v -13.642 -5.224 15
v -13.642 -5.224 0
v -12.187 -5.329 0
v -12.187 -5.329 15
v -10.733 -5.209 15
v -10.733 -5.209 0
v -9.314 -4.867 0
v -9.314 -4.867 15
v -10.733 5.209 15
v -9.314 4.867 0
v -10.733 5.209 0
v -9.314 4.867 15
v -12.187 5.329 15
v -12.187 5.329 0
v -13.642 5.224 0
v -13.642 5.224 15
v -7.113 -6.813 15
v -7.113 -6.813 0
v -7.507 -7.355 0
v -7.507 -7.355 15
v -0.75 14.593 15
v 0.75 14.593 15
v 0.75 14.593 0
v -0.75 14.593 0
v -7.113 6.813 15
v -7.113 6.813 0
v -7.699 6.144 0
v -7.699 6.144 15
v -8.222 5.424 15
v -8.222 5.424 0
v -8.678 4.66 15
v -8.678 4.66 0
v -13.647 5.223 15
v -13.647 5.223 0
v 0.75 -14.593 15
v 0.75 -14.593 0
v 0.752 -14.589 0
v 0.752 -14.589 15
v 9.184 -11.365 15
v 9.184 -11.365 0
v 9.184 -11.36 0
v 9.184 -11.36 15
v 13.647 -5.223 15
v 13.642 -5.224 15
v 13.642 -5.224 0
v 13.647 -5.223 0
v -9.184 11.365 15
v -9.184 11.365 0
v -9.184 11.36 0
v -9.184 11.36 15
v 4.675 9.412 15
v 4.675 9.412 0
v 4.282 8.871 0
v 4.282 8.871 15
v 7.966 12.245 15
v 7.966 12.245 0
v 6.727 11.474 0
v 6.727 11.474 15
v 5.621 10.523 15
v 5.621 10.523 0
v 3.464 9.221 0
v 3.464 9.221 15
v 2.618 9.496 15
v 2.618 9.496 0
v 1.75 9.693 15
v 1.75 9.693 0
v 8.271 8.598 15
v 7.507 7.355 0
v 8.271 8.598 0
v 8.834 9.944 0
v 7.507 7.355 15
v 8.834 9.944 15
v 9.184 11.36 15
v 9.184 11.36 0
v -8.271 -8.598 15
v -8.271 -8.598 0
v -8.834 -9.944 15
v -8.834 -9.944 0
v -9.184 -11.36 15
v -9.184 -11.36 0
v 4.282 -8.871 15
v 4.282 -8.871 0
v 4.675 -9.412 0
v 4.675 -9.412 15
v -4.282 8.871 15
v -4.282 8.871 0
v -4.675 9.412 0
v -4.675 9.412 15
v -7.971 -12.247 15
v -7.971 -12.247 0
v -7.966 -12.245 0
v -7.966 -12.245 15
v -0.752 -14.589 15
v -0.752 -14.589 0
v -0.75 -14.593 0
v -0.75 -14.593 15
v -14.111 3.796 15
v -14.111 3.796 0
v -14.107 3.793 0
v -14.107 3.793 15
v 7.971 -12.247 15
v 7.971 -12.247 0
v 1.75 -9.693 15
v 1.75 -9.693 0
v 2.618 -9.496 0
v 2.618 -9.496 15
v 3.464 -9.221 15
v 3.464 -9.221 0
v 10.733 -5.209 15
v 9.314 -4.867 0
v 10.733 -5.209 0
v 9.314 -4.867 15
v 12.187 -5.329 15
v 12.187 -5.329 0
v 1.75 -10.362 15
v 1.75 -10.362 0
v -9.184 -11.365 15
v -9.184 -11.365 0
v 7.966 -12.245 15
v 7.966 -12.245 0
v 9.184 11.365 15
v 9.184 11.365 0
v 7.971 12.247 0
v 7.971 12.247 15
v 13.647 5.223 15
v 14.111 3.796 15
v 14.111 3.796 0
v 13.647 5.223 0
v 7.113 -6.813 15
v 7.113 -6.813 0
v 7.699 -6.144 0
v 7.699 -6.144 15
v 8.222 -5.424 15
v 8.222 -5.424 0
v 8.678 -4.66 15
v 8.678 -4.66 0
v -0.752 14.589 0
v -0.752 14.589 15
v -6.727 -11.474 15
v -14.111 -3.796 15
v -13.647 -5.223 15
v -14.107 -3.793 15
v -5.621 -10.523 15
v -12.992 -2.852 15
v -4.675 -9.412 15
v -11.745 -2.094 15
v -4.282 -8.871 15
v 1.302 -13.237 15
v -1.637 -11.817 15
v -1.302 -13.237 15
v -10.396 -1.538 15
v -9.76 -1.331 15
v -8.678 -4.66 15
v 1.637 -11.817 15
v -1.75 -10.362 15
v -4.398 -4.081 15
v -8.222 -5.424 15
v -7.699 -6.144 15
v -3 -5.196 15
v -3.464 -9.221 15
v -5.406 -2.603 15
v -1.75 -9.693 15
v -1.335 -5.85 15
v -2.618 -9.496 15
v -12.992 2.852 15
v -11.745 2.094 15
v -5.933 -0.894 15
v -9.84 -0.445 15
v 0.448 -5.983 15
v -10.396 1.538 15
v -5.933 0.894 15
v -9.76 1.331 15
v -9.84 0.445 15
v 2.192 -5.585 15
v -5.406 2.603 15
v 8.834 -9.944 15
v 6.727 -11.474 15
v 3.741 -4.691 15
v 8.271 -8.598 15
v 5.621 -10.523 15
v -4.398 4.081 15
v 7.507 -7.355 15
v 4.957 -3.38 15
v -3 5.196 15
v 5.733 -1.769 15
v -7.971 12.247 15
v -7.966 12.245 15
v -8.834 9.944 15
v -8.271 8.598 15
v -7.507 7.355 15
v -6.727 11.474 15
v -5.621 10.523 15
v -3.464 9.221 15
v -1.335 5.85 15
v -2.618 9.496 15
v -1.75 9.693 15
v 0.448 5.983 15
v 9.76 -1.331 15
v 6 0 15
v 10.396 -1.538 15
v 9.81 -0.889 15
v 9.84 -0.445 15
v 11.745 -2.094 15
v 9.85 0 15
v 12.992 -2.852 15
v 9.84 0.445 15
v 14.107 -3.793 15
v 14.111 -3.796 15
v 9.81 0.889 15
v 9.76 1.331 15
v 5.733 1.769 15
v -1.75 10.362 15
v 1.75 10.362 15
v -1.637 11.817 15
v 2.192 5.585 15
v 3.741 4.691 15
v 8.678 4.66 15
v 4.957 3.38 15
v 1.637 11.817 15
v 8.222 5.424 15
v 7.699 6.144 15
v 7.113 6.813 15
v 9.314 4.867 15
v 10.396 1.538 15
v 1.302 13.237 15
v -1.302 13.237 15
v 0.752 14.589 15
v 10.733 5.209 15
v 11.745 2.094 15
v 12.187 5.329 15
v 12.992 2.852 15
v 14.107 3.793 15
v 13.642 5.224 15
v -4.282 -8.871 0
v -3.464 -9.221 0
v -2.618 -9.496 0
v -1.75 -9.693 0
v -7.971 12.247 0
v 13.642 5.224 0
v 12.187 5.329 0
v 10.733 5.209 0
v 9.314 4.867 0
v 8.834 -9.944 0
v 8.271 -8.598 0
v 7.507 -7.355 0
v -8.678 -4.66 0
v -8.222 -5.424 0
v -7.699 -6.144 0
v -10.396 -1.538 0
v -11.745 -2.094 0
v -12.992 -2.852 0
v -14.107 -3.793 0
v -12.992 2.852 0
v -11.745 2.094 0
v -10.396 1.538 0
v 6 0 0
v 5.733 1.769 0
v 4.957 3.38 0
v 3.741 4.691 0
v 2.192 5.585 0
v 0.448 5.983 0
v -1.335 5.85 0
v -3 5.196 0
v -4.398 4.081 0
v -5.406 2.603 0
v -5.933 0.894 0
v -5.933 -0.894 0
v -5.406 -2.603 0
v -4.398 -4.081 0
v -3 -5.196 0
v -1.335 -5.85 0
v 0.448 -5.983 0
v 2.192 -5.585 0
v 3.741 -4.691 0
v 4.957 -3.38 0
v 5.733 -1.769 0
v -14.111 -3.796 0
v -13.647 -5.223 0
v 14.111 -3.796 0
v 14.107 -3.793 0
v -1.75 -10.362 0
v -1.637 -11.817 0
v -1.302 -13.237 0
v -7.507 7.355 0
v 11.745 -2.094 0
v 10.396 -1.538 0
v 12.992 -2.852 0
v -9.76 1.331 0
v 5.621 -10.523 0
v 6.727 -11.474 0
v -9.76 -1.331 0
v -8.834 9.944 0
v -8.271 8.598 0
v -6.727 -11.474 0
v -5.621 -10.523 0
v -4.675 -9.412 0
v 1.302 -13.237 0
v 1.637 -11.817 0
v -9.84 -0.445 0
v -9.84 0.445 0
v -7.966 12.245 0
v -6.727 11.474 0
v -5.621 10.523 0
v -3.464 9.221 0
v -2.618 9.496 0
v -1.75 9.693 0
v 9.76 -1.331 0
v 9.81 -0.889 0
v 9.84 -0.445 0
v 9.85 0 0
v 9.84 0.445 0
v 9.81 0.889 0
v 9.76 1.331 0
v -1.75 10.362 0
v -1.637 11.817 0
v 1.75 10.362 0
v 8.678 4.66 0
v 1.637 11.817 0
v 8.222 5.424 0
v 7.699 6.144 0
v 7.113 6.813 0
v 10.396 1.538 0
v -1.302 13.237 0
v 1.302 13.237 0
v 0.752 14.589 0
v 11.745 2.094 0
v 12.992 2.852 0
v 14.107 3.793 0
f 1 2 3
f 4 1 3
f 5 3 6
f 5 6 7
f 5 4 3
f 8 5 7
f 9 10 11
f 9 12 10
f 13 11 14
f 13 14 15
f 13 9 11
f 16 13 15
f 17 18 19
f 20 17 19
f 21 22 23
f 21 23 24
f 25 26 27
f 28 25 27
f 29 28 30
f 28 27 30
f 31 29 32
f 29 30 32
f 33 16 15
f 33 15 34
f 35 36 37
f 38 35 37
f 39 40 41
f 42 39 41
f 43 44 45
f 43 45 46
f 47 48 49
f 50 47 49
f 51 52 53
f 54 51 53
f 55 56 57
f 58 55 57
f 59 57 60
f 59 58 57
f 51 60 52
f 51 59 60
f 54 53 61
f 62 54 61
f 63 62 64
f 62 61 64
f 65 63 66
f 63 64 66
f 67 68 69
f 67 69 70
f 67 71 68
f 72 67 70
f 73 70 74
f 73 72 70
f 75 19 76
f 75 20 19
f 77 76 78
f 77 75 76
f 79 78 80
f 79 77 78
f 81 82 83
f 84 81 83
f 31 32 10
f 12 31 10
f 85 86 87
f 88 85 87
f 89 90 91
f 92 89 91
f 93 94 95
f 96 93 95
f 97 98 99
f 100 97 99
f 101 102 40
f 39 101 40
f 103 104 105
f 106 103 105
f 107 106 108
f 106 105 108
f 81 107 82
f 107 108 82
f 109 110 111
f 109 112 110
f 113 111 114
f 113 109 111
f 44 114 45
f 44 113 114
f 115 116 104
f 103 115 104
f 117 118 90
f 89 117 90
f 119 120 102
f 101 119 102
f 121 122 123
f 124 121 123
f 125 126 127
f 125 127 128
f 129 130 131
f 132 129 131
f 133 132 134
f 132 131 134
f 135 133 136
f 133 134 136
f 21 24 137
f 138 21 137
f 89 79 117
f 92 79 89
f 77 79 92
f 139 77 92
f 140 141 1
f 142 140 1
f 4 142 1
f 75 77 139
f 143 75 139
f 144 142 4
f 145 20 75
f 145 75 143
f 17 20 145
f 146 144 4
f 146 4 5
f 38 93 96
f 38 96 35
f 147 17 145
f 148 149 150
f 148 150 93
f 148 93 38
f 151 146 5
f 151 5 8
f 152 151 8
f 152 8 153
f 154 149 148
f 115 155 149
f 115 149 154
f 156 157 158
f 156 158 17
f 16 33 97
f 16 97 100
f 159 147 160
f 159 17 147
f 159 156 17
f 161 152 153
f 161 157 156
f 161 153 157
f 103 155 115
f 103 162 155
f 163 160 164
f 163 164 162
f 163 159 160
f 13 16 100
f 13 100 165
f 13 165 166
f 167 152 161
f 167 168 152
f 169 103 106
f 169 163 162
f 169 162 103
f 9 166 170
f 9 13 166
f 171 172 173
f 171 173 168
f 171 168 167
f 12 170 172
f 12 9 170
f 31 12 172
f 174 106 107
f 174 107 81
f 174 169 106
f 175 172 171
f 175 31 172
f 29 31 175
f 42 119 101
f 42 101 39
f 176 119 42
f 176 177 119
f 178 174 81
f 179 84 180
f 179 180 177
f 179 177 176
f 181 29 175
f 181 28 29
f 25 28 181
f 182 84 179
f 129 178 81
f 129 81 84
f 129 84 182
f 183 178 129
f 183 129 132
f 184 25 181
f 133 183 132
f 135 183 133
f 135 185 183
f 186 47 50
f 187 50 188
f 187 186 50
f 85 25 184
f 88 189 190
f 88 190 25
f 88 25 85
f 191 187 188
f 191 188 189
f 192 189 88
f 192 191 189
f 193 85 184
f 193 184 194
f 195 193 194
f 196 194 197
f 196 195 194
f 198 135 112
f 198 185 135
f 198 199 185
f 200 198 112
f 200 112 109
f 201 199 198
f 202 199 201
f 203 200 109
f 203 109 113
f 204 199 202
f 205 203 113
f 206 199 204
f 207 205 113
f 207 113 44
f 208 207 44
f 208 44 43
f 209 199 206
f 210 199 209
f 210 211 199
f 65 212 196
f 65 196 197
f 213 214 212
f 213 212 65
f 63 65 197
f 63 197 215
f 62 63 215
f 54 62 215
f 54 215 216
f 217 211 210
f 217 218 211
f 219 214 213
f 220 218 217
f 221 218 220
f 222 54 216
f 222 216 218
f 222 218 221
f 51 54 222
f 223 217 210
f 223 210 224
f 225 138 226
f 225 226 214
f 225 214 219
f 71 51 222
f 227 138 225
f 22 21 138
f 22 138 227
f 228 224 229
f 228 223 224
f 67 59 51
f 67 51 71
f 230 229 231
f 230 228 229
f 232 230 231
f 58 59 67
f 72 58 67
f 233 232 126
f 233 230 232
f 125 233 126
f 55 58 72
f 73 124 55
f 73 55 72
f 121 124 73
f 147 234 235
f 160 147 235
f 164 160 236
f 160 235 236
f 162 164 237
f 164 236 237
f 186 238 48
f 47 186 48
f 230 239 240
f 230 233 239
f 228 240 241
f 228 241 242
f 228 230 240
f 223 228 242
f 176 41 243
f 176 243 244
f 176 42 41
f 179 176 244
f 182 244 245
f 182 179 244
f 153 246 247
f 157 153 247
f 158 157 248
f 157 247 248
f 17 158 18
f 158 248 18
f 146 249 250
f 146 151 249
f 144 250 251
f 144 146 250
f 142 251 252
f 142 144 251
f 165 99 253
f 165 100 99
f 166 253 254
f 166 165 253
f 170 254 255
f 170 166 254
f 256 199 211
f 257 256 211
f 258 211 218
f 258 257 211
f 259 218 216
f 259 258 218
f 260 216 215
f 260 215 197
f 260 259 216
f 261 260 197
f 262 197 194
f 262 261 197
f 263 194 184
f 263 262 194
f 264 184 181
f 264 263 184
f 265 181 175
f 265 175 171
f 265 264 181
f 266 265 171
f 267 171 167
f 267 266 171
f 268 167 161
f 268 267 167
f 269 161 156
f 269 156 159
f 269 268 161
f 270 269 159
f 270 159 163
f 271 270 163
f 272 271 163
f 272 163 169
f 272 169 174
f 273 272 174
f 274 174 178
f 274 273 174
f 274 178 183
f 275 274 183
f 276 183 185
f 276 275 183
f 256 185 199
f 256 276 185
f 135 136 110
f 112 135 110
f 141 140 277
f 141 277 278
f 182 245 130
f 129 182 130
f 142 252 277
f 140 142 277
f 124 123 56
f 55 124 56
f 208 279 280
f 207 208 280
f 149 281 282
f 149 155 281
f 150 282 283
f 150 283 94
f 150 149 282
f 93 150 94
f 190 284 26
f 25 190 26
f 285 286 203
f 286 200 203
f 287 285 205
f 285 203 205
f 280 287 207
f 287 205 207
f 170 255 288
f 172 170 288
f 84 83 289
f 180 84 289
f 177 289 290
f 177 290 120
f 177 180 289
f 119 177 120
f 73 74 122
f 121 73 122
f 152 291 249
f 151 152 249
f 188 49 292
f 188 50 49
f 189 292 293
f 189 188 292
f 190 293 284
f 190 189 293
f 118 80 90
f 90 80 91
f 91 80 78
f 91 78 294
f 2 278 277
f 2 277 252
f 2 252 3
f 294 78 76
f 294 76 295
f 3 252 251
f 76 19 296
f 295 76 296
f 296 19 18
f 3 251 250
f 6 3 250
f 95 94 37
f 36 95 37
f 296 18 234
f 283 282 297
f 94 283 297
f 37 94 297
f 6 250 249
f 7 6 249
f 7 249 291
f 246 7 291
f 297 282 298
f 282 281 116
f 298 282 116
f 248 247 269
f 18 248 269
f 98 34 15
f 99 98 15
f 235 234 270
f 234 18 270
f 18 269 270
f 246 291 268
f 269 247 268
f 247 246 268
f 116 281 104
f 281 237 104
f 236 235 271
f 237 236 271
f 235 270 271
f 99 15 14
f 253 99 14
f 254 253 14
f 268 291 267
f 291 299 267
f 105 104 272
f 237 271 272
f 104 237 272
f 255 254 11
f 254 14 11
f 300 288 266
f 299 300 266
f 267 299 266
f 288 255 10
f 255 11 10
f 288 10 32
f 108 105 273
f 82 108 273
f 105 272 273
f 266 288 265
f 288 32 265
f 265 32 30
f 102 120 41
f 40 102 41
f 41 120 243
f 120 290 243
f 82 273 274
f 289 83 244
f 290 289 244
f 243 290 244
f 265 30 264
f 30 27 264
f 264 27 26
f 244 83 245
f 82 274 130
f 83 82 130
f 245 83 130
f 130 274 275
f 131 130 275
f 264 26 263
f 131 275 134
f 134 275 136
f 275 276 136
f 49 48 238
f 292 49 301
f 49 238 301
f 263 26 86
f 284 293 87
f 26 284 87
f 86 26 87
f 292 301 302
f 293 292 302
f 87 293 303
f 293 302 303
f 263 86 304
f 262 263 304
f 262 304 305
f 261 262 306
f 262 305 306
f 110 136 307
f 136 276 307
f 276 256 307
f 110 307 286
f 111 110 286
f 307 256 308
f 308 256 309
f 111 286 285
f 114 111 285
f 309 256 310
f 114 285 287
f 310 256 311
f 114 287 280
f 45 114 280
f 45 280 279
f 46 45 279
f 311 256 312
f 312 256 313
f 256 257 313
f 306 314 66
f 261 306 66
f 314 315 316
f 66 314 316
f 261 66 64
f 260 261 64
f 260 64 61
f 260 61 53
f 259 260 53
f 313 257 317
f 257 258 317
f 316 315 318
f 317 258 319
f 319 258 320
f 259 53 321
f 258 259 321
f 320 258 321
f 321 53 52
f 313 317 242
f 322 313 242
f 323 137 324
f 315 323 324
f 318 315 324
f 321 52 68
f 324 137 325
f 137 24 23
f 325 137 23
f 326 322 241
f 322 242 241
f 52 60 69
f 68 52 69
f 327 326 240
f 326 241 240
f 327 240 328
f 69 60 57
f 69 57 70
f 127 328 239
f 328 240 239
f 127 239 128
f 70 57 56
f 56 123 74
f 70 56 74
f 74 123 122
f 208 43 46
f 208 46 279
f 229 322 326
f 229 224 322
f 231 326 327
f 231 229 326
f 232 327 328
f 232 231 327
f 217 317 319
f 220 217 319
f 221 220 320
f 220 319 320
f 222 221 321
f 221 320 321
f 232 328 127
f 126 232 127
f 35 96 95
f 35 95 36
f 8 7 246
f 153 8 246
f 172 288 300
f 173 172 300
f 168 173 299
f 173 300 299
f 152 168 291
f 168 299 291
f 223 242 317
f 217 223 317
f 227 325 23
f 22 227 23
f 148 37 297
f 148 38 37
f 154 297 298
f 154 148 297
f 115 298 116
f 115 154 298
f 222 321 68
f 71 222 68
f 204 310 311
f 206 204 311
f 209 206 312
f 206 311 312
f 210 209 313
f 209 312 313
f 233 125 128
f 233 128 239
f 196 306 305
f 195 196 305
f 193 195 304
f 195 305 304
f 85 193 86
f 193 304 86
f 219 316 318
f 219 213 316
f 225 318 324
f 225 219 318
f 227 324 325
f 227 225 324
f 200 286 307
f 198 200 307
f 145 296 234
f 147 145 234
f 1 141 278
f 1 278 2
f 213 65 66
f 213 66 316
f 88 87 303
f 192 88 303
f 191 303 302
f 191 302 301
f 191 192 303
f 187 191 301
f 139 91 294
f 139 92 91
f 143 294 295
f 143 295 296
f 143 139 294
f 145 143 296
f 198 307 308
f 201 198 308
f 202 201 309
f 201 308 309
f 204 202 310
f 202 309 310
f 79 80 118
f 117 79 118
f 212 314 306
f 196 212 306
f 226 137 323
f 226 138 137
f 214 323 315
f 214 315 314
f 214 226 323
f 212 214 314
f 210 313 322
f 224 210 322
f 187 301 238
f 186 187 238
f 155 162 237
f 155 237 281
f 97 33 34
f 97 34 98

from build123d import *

# Parameters (mm, degrees)
F0_R     = 6
F1_DEPTH = 15
F2_R     = 9.45


with BuildPart() as f1:
    # F0 (on Top) → F1 (new body)
    with BuildSketch(Plane.XY):
        with BuildLine():
            Line((12.517717, -2.227194), (9.759653, -1.331044))
            ThreePointArc((9.759653, -1.331044), (9.367907, -3.043817), (8.678093, -4.659742))
            Line((8.678093, -4.659742), (11.436157, -5.555892))
            Line((11.436157, -5.555892), (13.647287, -5.222869))
            Line((13.647287, -5.222869), (14.110813, -3.796284))
            Line((14.110813, -3.796284), (12.517717, -2.227194))
        make_face()
        with BuildLine():
            Line((8.817934, -9.159567), (7.113357, -6.813418))
            ThreePointArc((7.113357, -6.813418), (5.789685, -7.968817), (4.281797, -8.870666))
            Line((4.281797, -8.870666), (5.986374, -11.216815))
            Line((5.986374, -11.216815), (7.970962, -12.247064))
            Line((7.970962, -12.247064), (9.184487, -11.365386))
            Line((9.184487, -11.365386), (8.817934, -9.159567))
        make_face()
        with BuildLine():
            ThreePointArc((9.759653, -1.331044), (9.827387, -0.667054), (9.85, 0))
            ThreePointArc((9.85, 0), (9.827387, 0.667054), (9.759653, 1.331044))
            ThreePointArc((9.759653, 1.331044), (9.367907, 3.043817), (8.678093, 4.659742))
            ThreePointArc((8.678093, 4.659742), (7.968817, 5.789685), (7.113357, 6.813418))
            ThreePointArc((7.113357, 6.813418), (5.789685, 7.968817), (4.281797, 8.870666))
            ThreePointArc((4.281797, 8.870666), (3.043817, 9.367907), (1.75, 9.693297))
            ThreePointArc((1.75, 9.693297), (0, 9.85), (-1.75, 9.693297))
            ThreePointArc((-1.75, 9.693297), (-3.043817, 9.367907), (-4.281797, 8.870666))
            ThreePointArc((-4.281797, 8.870666), (-5.789685, 7.968817), (-7.113357, 6.813418))
            ThreePointArc((-7.113357, 6.813418), (-7.968817, 5.789685), (-8.678093, 4.659742))
            ThreePointArc((-8.678093, 4.659742), (-9.367907, 3.043817), (-9.759653, 1.331044))
            ThreePointArc((-9.759653, 1.331044), (-9.85, 0), (-9.759653, -1.331044))
            ThreePointArc((-9.759653, -1.331044), (-9.367907, -3.043817), (-8.678093, -4.659742))
            ThreePointArc((-8.678093, -4.659742), (-7.968817, -5.789685), (-7.113357, -6.813418))
            ThreePointArc((-7.113357, -6.813418), (-5.789685, -7.968817), (-4.281797, -8.870666))
            ThreePointArc((-4.281797, -8.870666), (-3.043817, -9.367907), (-1.75, -9.693297))
            ThreePointArc((-1.75, -9.693297), (0, -9.85), (1.75, -9.693297))
            ThreePointArc((1.75, -9.693297), (3.043817, -9.367907), (4.281797, -8.870666))
            ThreePointArc((4.281797, -8.870666), (5.789685, -7.968817), (7.113357, -6.813418))
            ThreePointArc((7.113357, -6.813418), (7.968817, -5.789685), (8.678093, -4.659742))
            ThreePointArc((8.678093, -4.659742), (9.367907, -3.043817), (9.759653, -1.331044))
        make_face()
        Circle(F0_R, mode=Mode.SUBTRACT)
        with BuildLine():
            ThreePointArc((8.678093, 4.659742), (9.367907, 3.043817), (9.759653, 1.331044))
            Line((9.759653, 1.331044), (12.517717, 2.227194))
            Line((12.517717, 2.227194), (14.110813, 3.796284))
            Line((14.110813, 3.796284), (13.647287, 5.222869))
            Line((13.647287, 5.222869), (11.436157, 5.555892))
            Line((11.436157, 5.555892), (8.678093, 4.659742))
        make_face()
        with BuildLine():
            ThreePointArc((4.281797, 8.870666), (5.789685, 7.968817), (7.113357, 6.813418))
            Line((7.113357, 6.813418), (8.817934, 9.159567))
            Line((8.817934, 9.159567), (9.184487, 11.365386))
            Line((9.184487, 11.365386), (7.970962, 12.247064))
            Line((7.970962, 12.247064), (5.986374, 11.216815))
            Line((5.986374, 11.216815), (4.281797, 8.870666))
        make_face()
        with BuildLine():
            ThreePointArc((-1.75, 9.693297), (0, 9.85), (1.75, 9.693297))
            Line((1.75, 9.693297), (1.75, 12.593297))
            Line((1.75, 12.593297), (0.75, 14.593297))
            Line((0.75, 14.593297), (-0.75, 14.593297))
            Line((-0.75, 14.593297), (-1.75, 12.593297))
            Line((-1.75, 12.593297), (-1.75, 9.693297))
        make_face()
        with BuildLine():
            ThreePointArc((-7.113357, 6.813418), (-5.789685, 7.968817), (-4.281797, 8.870666))
            Line((-4.281797, 8.870666), (-5.986374, 11.216815))
            Line((-5.986374, 11.216815), (-7.970962, 12.247064))
            Line((-7.970962, 12.247064), (-9.184487, 11.365386))
            Line((-9.184487, 11.365386), (-8.817934, 9.159567))
            Line((-8.817934, 9.159567), (-7.113357, 6.813418))
        make_face()
        with BuildLine():
            ThreePointArc((-9.759653, 1.331044), (-9.367907, 3.043817), (-8.678093, 4.659742))
            Line((-8.678093, 4.659742), (-11.436157, 5.555892))
            Line((-11.436157, 5.555892), (-13.647287, 5.222869))
            Line((-13.647287, 5.222869), (-14.110813, 3.796284))
            Line((-14.110813, 3.796284), (-12.517717, 2.227194))
            Line((-12.517717, 2.227194), (-9.759653, 1.331044))
        make_face()
        with BuildLine():
            Line((-11.436157, -5.555892), (-8.678093, -4.659742))
            ThreePointArc((-8.678093, -4.659742), (-9.367907, -3.043817), (-9.759653, -1.331044))
            Line((-9.759653, -1.331044), (-12.517717, -2.227194))
            Line((-12.517717, -2.227194), (-14.110813, -3.796284))
            Line((-14.110813, -3.796284), (-13.647287, -5.222869))
            Line((-13.647287, -5.222869), (-11.436157, -5.555892))
        make_face()
        with BuildLine():
            Line((-5.986374, -11.216815), (-4.281797, -8.870666))
            ThreePointArc((-4.281797, -8.870666), (-5.789685, -7.968817), (-7.113357, -6.813418))
            Line((-7.113357, -6.813418), (-8.817934, -9.159567))
            Line((-8.817934, -9.159567), (-9.184487, -11.365386))
            Line((-9.184487, -11.365386), (-7.970962, -12.247064))
            Line((-7.970962, -12.247064), (-5.986374, -11.216815))
        make_face()
        with BuildLine():
            Line((1.75, -12.593297), (1.75, -9.693297))
            ThreePointArc((1.75, -9.693297), (0, -9.85), (-1.75, -9.693297))
            Line((-1.75, -9.693297), (-1.75, -12.593297))
            Line((-1.75, -12.593297), (-0.75, -14.593297))
            Line((-0.75, -14.593297), (0.75, -14.593297))
            Line((0.75, -14.593297), (1.75, -12.593297))
        make_face()
    extrude(amount=F1_DEPTH)

    # F2
    f2_edges = [f1.edges().sort_by_distance(p)[0] for p in [
        (8.817934, -9.159567, 7.5),
        (5.986374, -11.216815, 7.5),
        (11.436157, -5.555892, 7.5),
        (12.517717, -2.227194, 7.5),
        (12.517717, 2.227194, 7.5),
        (11.436157, 5.555892, 7.5),
        (8.817934, 9.159567, 7.5),
        (5.986374, 11.216815, 7.5),
        (1.75, 12.593297, 7.5),
        (-1.75, 12.593297, 7.5),
        (-5.986374, 11.216815, 7.5),
        (-8.817934, 9.159567, 7.5),
        (-11.436157, 5.555892, 7.5),
        (-12.517717, 2.227194, 7.5),
        (-12.517717, -2.227194, 7.5),
        (-11.436157, -5.555892, 7.5),
        (-8.817934, -9.159567, 7.5),
        (-5.986374, -11.216815, 7.5),
        (-1.75, -12.593297, 7.5),
        (1.75, -12.593297, 7.5),
    ]]
    fillet(f2_edges, radius=F2_R)


solid = f1.part
